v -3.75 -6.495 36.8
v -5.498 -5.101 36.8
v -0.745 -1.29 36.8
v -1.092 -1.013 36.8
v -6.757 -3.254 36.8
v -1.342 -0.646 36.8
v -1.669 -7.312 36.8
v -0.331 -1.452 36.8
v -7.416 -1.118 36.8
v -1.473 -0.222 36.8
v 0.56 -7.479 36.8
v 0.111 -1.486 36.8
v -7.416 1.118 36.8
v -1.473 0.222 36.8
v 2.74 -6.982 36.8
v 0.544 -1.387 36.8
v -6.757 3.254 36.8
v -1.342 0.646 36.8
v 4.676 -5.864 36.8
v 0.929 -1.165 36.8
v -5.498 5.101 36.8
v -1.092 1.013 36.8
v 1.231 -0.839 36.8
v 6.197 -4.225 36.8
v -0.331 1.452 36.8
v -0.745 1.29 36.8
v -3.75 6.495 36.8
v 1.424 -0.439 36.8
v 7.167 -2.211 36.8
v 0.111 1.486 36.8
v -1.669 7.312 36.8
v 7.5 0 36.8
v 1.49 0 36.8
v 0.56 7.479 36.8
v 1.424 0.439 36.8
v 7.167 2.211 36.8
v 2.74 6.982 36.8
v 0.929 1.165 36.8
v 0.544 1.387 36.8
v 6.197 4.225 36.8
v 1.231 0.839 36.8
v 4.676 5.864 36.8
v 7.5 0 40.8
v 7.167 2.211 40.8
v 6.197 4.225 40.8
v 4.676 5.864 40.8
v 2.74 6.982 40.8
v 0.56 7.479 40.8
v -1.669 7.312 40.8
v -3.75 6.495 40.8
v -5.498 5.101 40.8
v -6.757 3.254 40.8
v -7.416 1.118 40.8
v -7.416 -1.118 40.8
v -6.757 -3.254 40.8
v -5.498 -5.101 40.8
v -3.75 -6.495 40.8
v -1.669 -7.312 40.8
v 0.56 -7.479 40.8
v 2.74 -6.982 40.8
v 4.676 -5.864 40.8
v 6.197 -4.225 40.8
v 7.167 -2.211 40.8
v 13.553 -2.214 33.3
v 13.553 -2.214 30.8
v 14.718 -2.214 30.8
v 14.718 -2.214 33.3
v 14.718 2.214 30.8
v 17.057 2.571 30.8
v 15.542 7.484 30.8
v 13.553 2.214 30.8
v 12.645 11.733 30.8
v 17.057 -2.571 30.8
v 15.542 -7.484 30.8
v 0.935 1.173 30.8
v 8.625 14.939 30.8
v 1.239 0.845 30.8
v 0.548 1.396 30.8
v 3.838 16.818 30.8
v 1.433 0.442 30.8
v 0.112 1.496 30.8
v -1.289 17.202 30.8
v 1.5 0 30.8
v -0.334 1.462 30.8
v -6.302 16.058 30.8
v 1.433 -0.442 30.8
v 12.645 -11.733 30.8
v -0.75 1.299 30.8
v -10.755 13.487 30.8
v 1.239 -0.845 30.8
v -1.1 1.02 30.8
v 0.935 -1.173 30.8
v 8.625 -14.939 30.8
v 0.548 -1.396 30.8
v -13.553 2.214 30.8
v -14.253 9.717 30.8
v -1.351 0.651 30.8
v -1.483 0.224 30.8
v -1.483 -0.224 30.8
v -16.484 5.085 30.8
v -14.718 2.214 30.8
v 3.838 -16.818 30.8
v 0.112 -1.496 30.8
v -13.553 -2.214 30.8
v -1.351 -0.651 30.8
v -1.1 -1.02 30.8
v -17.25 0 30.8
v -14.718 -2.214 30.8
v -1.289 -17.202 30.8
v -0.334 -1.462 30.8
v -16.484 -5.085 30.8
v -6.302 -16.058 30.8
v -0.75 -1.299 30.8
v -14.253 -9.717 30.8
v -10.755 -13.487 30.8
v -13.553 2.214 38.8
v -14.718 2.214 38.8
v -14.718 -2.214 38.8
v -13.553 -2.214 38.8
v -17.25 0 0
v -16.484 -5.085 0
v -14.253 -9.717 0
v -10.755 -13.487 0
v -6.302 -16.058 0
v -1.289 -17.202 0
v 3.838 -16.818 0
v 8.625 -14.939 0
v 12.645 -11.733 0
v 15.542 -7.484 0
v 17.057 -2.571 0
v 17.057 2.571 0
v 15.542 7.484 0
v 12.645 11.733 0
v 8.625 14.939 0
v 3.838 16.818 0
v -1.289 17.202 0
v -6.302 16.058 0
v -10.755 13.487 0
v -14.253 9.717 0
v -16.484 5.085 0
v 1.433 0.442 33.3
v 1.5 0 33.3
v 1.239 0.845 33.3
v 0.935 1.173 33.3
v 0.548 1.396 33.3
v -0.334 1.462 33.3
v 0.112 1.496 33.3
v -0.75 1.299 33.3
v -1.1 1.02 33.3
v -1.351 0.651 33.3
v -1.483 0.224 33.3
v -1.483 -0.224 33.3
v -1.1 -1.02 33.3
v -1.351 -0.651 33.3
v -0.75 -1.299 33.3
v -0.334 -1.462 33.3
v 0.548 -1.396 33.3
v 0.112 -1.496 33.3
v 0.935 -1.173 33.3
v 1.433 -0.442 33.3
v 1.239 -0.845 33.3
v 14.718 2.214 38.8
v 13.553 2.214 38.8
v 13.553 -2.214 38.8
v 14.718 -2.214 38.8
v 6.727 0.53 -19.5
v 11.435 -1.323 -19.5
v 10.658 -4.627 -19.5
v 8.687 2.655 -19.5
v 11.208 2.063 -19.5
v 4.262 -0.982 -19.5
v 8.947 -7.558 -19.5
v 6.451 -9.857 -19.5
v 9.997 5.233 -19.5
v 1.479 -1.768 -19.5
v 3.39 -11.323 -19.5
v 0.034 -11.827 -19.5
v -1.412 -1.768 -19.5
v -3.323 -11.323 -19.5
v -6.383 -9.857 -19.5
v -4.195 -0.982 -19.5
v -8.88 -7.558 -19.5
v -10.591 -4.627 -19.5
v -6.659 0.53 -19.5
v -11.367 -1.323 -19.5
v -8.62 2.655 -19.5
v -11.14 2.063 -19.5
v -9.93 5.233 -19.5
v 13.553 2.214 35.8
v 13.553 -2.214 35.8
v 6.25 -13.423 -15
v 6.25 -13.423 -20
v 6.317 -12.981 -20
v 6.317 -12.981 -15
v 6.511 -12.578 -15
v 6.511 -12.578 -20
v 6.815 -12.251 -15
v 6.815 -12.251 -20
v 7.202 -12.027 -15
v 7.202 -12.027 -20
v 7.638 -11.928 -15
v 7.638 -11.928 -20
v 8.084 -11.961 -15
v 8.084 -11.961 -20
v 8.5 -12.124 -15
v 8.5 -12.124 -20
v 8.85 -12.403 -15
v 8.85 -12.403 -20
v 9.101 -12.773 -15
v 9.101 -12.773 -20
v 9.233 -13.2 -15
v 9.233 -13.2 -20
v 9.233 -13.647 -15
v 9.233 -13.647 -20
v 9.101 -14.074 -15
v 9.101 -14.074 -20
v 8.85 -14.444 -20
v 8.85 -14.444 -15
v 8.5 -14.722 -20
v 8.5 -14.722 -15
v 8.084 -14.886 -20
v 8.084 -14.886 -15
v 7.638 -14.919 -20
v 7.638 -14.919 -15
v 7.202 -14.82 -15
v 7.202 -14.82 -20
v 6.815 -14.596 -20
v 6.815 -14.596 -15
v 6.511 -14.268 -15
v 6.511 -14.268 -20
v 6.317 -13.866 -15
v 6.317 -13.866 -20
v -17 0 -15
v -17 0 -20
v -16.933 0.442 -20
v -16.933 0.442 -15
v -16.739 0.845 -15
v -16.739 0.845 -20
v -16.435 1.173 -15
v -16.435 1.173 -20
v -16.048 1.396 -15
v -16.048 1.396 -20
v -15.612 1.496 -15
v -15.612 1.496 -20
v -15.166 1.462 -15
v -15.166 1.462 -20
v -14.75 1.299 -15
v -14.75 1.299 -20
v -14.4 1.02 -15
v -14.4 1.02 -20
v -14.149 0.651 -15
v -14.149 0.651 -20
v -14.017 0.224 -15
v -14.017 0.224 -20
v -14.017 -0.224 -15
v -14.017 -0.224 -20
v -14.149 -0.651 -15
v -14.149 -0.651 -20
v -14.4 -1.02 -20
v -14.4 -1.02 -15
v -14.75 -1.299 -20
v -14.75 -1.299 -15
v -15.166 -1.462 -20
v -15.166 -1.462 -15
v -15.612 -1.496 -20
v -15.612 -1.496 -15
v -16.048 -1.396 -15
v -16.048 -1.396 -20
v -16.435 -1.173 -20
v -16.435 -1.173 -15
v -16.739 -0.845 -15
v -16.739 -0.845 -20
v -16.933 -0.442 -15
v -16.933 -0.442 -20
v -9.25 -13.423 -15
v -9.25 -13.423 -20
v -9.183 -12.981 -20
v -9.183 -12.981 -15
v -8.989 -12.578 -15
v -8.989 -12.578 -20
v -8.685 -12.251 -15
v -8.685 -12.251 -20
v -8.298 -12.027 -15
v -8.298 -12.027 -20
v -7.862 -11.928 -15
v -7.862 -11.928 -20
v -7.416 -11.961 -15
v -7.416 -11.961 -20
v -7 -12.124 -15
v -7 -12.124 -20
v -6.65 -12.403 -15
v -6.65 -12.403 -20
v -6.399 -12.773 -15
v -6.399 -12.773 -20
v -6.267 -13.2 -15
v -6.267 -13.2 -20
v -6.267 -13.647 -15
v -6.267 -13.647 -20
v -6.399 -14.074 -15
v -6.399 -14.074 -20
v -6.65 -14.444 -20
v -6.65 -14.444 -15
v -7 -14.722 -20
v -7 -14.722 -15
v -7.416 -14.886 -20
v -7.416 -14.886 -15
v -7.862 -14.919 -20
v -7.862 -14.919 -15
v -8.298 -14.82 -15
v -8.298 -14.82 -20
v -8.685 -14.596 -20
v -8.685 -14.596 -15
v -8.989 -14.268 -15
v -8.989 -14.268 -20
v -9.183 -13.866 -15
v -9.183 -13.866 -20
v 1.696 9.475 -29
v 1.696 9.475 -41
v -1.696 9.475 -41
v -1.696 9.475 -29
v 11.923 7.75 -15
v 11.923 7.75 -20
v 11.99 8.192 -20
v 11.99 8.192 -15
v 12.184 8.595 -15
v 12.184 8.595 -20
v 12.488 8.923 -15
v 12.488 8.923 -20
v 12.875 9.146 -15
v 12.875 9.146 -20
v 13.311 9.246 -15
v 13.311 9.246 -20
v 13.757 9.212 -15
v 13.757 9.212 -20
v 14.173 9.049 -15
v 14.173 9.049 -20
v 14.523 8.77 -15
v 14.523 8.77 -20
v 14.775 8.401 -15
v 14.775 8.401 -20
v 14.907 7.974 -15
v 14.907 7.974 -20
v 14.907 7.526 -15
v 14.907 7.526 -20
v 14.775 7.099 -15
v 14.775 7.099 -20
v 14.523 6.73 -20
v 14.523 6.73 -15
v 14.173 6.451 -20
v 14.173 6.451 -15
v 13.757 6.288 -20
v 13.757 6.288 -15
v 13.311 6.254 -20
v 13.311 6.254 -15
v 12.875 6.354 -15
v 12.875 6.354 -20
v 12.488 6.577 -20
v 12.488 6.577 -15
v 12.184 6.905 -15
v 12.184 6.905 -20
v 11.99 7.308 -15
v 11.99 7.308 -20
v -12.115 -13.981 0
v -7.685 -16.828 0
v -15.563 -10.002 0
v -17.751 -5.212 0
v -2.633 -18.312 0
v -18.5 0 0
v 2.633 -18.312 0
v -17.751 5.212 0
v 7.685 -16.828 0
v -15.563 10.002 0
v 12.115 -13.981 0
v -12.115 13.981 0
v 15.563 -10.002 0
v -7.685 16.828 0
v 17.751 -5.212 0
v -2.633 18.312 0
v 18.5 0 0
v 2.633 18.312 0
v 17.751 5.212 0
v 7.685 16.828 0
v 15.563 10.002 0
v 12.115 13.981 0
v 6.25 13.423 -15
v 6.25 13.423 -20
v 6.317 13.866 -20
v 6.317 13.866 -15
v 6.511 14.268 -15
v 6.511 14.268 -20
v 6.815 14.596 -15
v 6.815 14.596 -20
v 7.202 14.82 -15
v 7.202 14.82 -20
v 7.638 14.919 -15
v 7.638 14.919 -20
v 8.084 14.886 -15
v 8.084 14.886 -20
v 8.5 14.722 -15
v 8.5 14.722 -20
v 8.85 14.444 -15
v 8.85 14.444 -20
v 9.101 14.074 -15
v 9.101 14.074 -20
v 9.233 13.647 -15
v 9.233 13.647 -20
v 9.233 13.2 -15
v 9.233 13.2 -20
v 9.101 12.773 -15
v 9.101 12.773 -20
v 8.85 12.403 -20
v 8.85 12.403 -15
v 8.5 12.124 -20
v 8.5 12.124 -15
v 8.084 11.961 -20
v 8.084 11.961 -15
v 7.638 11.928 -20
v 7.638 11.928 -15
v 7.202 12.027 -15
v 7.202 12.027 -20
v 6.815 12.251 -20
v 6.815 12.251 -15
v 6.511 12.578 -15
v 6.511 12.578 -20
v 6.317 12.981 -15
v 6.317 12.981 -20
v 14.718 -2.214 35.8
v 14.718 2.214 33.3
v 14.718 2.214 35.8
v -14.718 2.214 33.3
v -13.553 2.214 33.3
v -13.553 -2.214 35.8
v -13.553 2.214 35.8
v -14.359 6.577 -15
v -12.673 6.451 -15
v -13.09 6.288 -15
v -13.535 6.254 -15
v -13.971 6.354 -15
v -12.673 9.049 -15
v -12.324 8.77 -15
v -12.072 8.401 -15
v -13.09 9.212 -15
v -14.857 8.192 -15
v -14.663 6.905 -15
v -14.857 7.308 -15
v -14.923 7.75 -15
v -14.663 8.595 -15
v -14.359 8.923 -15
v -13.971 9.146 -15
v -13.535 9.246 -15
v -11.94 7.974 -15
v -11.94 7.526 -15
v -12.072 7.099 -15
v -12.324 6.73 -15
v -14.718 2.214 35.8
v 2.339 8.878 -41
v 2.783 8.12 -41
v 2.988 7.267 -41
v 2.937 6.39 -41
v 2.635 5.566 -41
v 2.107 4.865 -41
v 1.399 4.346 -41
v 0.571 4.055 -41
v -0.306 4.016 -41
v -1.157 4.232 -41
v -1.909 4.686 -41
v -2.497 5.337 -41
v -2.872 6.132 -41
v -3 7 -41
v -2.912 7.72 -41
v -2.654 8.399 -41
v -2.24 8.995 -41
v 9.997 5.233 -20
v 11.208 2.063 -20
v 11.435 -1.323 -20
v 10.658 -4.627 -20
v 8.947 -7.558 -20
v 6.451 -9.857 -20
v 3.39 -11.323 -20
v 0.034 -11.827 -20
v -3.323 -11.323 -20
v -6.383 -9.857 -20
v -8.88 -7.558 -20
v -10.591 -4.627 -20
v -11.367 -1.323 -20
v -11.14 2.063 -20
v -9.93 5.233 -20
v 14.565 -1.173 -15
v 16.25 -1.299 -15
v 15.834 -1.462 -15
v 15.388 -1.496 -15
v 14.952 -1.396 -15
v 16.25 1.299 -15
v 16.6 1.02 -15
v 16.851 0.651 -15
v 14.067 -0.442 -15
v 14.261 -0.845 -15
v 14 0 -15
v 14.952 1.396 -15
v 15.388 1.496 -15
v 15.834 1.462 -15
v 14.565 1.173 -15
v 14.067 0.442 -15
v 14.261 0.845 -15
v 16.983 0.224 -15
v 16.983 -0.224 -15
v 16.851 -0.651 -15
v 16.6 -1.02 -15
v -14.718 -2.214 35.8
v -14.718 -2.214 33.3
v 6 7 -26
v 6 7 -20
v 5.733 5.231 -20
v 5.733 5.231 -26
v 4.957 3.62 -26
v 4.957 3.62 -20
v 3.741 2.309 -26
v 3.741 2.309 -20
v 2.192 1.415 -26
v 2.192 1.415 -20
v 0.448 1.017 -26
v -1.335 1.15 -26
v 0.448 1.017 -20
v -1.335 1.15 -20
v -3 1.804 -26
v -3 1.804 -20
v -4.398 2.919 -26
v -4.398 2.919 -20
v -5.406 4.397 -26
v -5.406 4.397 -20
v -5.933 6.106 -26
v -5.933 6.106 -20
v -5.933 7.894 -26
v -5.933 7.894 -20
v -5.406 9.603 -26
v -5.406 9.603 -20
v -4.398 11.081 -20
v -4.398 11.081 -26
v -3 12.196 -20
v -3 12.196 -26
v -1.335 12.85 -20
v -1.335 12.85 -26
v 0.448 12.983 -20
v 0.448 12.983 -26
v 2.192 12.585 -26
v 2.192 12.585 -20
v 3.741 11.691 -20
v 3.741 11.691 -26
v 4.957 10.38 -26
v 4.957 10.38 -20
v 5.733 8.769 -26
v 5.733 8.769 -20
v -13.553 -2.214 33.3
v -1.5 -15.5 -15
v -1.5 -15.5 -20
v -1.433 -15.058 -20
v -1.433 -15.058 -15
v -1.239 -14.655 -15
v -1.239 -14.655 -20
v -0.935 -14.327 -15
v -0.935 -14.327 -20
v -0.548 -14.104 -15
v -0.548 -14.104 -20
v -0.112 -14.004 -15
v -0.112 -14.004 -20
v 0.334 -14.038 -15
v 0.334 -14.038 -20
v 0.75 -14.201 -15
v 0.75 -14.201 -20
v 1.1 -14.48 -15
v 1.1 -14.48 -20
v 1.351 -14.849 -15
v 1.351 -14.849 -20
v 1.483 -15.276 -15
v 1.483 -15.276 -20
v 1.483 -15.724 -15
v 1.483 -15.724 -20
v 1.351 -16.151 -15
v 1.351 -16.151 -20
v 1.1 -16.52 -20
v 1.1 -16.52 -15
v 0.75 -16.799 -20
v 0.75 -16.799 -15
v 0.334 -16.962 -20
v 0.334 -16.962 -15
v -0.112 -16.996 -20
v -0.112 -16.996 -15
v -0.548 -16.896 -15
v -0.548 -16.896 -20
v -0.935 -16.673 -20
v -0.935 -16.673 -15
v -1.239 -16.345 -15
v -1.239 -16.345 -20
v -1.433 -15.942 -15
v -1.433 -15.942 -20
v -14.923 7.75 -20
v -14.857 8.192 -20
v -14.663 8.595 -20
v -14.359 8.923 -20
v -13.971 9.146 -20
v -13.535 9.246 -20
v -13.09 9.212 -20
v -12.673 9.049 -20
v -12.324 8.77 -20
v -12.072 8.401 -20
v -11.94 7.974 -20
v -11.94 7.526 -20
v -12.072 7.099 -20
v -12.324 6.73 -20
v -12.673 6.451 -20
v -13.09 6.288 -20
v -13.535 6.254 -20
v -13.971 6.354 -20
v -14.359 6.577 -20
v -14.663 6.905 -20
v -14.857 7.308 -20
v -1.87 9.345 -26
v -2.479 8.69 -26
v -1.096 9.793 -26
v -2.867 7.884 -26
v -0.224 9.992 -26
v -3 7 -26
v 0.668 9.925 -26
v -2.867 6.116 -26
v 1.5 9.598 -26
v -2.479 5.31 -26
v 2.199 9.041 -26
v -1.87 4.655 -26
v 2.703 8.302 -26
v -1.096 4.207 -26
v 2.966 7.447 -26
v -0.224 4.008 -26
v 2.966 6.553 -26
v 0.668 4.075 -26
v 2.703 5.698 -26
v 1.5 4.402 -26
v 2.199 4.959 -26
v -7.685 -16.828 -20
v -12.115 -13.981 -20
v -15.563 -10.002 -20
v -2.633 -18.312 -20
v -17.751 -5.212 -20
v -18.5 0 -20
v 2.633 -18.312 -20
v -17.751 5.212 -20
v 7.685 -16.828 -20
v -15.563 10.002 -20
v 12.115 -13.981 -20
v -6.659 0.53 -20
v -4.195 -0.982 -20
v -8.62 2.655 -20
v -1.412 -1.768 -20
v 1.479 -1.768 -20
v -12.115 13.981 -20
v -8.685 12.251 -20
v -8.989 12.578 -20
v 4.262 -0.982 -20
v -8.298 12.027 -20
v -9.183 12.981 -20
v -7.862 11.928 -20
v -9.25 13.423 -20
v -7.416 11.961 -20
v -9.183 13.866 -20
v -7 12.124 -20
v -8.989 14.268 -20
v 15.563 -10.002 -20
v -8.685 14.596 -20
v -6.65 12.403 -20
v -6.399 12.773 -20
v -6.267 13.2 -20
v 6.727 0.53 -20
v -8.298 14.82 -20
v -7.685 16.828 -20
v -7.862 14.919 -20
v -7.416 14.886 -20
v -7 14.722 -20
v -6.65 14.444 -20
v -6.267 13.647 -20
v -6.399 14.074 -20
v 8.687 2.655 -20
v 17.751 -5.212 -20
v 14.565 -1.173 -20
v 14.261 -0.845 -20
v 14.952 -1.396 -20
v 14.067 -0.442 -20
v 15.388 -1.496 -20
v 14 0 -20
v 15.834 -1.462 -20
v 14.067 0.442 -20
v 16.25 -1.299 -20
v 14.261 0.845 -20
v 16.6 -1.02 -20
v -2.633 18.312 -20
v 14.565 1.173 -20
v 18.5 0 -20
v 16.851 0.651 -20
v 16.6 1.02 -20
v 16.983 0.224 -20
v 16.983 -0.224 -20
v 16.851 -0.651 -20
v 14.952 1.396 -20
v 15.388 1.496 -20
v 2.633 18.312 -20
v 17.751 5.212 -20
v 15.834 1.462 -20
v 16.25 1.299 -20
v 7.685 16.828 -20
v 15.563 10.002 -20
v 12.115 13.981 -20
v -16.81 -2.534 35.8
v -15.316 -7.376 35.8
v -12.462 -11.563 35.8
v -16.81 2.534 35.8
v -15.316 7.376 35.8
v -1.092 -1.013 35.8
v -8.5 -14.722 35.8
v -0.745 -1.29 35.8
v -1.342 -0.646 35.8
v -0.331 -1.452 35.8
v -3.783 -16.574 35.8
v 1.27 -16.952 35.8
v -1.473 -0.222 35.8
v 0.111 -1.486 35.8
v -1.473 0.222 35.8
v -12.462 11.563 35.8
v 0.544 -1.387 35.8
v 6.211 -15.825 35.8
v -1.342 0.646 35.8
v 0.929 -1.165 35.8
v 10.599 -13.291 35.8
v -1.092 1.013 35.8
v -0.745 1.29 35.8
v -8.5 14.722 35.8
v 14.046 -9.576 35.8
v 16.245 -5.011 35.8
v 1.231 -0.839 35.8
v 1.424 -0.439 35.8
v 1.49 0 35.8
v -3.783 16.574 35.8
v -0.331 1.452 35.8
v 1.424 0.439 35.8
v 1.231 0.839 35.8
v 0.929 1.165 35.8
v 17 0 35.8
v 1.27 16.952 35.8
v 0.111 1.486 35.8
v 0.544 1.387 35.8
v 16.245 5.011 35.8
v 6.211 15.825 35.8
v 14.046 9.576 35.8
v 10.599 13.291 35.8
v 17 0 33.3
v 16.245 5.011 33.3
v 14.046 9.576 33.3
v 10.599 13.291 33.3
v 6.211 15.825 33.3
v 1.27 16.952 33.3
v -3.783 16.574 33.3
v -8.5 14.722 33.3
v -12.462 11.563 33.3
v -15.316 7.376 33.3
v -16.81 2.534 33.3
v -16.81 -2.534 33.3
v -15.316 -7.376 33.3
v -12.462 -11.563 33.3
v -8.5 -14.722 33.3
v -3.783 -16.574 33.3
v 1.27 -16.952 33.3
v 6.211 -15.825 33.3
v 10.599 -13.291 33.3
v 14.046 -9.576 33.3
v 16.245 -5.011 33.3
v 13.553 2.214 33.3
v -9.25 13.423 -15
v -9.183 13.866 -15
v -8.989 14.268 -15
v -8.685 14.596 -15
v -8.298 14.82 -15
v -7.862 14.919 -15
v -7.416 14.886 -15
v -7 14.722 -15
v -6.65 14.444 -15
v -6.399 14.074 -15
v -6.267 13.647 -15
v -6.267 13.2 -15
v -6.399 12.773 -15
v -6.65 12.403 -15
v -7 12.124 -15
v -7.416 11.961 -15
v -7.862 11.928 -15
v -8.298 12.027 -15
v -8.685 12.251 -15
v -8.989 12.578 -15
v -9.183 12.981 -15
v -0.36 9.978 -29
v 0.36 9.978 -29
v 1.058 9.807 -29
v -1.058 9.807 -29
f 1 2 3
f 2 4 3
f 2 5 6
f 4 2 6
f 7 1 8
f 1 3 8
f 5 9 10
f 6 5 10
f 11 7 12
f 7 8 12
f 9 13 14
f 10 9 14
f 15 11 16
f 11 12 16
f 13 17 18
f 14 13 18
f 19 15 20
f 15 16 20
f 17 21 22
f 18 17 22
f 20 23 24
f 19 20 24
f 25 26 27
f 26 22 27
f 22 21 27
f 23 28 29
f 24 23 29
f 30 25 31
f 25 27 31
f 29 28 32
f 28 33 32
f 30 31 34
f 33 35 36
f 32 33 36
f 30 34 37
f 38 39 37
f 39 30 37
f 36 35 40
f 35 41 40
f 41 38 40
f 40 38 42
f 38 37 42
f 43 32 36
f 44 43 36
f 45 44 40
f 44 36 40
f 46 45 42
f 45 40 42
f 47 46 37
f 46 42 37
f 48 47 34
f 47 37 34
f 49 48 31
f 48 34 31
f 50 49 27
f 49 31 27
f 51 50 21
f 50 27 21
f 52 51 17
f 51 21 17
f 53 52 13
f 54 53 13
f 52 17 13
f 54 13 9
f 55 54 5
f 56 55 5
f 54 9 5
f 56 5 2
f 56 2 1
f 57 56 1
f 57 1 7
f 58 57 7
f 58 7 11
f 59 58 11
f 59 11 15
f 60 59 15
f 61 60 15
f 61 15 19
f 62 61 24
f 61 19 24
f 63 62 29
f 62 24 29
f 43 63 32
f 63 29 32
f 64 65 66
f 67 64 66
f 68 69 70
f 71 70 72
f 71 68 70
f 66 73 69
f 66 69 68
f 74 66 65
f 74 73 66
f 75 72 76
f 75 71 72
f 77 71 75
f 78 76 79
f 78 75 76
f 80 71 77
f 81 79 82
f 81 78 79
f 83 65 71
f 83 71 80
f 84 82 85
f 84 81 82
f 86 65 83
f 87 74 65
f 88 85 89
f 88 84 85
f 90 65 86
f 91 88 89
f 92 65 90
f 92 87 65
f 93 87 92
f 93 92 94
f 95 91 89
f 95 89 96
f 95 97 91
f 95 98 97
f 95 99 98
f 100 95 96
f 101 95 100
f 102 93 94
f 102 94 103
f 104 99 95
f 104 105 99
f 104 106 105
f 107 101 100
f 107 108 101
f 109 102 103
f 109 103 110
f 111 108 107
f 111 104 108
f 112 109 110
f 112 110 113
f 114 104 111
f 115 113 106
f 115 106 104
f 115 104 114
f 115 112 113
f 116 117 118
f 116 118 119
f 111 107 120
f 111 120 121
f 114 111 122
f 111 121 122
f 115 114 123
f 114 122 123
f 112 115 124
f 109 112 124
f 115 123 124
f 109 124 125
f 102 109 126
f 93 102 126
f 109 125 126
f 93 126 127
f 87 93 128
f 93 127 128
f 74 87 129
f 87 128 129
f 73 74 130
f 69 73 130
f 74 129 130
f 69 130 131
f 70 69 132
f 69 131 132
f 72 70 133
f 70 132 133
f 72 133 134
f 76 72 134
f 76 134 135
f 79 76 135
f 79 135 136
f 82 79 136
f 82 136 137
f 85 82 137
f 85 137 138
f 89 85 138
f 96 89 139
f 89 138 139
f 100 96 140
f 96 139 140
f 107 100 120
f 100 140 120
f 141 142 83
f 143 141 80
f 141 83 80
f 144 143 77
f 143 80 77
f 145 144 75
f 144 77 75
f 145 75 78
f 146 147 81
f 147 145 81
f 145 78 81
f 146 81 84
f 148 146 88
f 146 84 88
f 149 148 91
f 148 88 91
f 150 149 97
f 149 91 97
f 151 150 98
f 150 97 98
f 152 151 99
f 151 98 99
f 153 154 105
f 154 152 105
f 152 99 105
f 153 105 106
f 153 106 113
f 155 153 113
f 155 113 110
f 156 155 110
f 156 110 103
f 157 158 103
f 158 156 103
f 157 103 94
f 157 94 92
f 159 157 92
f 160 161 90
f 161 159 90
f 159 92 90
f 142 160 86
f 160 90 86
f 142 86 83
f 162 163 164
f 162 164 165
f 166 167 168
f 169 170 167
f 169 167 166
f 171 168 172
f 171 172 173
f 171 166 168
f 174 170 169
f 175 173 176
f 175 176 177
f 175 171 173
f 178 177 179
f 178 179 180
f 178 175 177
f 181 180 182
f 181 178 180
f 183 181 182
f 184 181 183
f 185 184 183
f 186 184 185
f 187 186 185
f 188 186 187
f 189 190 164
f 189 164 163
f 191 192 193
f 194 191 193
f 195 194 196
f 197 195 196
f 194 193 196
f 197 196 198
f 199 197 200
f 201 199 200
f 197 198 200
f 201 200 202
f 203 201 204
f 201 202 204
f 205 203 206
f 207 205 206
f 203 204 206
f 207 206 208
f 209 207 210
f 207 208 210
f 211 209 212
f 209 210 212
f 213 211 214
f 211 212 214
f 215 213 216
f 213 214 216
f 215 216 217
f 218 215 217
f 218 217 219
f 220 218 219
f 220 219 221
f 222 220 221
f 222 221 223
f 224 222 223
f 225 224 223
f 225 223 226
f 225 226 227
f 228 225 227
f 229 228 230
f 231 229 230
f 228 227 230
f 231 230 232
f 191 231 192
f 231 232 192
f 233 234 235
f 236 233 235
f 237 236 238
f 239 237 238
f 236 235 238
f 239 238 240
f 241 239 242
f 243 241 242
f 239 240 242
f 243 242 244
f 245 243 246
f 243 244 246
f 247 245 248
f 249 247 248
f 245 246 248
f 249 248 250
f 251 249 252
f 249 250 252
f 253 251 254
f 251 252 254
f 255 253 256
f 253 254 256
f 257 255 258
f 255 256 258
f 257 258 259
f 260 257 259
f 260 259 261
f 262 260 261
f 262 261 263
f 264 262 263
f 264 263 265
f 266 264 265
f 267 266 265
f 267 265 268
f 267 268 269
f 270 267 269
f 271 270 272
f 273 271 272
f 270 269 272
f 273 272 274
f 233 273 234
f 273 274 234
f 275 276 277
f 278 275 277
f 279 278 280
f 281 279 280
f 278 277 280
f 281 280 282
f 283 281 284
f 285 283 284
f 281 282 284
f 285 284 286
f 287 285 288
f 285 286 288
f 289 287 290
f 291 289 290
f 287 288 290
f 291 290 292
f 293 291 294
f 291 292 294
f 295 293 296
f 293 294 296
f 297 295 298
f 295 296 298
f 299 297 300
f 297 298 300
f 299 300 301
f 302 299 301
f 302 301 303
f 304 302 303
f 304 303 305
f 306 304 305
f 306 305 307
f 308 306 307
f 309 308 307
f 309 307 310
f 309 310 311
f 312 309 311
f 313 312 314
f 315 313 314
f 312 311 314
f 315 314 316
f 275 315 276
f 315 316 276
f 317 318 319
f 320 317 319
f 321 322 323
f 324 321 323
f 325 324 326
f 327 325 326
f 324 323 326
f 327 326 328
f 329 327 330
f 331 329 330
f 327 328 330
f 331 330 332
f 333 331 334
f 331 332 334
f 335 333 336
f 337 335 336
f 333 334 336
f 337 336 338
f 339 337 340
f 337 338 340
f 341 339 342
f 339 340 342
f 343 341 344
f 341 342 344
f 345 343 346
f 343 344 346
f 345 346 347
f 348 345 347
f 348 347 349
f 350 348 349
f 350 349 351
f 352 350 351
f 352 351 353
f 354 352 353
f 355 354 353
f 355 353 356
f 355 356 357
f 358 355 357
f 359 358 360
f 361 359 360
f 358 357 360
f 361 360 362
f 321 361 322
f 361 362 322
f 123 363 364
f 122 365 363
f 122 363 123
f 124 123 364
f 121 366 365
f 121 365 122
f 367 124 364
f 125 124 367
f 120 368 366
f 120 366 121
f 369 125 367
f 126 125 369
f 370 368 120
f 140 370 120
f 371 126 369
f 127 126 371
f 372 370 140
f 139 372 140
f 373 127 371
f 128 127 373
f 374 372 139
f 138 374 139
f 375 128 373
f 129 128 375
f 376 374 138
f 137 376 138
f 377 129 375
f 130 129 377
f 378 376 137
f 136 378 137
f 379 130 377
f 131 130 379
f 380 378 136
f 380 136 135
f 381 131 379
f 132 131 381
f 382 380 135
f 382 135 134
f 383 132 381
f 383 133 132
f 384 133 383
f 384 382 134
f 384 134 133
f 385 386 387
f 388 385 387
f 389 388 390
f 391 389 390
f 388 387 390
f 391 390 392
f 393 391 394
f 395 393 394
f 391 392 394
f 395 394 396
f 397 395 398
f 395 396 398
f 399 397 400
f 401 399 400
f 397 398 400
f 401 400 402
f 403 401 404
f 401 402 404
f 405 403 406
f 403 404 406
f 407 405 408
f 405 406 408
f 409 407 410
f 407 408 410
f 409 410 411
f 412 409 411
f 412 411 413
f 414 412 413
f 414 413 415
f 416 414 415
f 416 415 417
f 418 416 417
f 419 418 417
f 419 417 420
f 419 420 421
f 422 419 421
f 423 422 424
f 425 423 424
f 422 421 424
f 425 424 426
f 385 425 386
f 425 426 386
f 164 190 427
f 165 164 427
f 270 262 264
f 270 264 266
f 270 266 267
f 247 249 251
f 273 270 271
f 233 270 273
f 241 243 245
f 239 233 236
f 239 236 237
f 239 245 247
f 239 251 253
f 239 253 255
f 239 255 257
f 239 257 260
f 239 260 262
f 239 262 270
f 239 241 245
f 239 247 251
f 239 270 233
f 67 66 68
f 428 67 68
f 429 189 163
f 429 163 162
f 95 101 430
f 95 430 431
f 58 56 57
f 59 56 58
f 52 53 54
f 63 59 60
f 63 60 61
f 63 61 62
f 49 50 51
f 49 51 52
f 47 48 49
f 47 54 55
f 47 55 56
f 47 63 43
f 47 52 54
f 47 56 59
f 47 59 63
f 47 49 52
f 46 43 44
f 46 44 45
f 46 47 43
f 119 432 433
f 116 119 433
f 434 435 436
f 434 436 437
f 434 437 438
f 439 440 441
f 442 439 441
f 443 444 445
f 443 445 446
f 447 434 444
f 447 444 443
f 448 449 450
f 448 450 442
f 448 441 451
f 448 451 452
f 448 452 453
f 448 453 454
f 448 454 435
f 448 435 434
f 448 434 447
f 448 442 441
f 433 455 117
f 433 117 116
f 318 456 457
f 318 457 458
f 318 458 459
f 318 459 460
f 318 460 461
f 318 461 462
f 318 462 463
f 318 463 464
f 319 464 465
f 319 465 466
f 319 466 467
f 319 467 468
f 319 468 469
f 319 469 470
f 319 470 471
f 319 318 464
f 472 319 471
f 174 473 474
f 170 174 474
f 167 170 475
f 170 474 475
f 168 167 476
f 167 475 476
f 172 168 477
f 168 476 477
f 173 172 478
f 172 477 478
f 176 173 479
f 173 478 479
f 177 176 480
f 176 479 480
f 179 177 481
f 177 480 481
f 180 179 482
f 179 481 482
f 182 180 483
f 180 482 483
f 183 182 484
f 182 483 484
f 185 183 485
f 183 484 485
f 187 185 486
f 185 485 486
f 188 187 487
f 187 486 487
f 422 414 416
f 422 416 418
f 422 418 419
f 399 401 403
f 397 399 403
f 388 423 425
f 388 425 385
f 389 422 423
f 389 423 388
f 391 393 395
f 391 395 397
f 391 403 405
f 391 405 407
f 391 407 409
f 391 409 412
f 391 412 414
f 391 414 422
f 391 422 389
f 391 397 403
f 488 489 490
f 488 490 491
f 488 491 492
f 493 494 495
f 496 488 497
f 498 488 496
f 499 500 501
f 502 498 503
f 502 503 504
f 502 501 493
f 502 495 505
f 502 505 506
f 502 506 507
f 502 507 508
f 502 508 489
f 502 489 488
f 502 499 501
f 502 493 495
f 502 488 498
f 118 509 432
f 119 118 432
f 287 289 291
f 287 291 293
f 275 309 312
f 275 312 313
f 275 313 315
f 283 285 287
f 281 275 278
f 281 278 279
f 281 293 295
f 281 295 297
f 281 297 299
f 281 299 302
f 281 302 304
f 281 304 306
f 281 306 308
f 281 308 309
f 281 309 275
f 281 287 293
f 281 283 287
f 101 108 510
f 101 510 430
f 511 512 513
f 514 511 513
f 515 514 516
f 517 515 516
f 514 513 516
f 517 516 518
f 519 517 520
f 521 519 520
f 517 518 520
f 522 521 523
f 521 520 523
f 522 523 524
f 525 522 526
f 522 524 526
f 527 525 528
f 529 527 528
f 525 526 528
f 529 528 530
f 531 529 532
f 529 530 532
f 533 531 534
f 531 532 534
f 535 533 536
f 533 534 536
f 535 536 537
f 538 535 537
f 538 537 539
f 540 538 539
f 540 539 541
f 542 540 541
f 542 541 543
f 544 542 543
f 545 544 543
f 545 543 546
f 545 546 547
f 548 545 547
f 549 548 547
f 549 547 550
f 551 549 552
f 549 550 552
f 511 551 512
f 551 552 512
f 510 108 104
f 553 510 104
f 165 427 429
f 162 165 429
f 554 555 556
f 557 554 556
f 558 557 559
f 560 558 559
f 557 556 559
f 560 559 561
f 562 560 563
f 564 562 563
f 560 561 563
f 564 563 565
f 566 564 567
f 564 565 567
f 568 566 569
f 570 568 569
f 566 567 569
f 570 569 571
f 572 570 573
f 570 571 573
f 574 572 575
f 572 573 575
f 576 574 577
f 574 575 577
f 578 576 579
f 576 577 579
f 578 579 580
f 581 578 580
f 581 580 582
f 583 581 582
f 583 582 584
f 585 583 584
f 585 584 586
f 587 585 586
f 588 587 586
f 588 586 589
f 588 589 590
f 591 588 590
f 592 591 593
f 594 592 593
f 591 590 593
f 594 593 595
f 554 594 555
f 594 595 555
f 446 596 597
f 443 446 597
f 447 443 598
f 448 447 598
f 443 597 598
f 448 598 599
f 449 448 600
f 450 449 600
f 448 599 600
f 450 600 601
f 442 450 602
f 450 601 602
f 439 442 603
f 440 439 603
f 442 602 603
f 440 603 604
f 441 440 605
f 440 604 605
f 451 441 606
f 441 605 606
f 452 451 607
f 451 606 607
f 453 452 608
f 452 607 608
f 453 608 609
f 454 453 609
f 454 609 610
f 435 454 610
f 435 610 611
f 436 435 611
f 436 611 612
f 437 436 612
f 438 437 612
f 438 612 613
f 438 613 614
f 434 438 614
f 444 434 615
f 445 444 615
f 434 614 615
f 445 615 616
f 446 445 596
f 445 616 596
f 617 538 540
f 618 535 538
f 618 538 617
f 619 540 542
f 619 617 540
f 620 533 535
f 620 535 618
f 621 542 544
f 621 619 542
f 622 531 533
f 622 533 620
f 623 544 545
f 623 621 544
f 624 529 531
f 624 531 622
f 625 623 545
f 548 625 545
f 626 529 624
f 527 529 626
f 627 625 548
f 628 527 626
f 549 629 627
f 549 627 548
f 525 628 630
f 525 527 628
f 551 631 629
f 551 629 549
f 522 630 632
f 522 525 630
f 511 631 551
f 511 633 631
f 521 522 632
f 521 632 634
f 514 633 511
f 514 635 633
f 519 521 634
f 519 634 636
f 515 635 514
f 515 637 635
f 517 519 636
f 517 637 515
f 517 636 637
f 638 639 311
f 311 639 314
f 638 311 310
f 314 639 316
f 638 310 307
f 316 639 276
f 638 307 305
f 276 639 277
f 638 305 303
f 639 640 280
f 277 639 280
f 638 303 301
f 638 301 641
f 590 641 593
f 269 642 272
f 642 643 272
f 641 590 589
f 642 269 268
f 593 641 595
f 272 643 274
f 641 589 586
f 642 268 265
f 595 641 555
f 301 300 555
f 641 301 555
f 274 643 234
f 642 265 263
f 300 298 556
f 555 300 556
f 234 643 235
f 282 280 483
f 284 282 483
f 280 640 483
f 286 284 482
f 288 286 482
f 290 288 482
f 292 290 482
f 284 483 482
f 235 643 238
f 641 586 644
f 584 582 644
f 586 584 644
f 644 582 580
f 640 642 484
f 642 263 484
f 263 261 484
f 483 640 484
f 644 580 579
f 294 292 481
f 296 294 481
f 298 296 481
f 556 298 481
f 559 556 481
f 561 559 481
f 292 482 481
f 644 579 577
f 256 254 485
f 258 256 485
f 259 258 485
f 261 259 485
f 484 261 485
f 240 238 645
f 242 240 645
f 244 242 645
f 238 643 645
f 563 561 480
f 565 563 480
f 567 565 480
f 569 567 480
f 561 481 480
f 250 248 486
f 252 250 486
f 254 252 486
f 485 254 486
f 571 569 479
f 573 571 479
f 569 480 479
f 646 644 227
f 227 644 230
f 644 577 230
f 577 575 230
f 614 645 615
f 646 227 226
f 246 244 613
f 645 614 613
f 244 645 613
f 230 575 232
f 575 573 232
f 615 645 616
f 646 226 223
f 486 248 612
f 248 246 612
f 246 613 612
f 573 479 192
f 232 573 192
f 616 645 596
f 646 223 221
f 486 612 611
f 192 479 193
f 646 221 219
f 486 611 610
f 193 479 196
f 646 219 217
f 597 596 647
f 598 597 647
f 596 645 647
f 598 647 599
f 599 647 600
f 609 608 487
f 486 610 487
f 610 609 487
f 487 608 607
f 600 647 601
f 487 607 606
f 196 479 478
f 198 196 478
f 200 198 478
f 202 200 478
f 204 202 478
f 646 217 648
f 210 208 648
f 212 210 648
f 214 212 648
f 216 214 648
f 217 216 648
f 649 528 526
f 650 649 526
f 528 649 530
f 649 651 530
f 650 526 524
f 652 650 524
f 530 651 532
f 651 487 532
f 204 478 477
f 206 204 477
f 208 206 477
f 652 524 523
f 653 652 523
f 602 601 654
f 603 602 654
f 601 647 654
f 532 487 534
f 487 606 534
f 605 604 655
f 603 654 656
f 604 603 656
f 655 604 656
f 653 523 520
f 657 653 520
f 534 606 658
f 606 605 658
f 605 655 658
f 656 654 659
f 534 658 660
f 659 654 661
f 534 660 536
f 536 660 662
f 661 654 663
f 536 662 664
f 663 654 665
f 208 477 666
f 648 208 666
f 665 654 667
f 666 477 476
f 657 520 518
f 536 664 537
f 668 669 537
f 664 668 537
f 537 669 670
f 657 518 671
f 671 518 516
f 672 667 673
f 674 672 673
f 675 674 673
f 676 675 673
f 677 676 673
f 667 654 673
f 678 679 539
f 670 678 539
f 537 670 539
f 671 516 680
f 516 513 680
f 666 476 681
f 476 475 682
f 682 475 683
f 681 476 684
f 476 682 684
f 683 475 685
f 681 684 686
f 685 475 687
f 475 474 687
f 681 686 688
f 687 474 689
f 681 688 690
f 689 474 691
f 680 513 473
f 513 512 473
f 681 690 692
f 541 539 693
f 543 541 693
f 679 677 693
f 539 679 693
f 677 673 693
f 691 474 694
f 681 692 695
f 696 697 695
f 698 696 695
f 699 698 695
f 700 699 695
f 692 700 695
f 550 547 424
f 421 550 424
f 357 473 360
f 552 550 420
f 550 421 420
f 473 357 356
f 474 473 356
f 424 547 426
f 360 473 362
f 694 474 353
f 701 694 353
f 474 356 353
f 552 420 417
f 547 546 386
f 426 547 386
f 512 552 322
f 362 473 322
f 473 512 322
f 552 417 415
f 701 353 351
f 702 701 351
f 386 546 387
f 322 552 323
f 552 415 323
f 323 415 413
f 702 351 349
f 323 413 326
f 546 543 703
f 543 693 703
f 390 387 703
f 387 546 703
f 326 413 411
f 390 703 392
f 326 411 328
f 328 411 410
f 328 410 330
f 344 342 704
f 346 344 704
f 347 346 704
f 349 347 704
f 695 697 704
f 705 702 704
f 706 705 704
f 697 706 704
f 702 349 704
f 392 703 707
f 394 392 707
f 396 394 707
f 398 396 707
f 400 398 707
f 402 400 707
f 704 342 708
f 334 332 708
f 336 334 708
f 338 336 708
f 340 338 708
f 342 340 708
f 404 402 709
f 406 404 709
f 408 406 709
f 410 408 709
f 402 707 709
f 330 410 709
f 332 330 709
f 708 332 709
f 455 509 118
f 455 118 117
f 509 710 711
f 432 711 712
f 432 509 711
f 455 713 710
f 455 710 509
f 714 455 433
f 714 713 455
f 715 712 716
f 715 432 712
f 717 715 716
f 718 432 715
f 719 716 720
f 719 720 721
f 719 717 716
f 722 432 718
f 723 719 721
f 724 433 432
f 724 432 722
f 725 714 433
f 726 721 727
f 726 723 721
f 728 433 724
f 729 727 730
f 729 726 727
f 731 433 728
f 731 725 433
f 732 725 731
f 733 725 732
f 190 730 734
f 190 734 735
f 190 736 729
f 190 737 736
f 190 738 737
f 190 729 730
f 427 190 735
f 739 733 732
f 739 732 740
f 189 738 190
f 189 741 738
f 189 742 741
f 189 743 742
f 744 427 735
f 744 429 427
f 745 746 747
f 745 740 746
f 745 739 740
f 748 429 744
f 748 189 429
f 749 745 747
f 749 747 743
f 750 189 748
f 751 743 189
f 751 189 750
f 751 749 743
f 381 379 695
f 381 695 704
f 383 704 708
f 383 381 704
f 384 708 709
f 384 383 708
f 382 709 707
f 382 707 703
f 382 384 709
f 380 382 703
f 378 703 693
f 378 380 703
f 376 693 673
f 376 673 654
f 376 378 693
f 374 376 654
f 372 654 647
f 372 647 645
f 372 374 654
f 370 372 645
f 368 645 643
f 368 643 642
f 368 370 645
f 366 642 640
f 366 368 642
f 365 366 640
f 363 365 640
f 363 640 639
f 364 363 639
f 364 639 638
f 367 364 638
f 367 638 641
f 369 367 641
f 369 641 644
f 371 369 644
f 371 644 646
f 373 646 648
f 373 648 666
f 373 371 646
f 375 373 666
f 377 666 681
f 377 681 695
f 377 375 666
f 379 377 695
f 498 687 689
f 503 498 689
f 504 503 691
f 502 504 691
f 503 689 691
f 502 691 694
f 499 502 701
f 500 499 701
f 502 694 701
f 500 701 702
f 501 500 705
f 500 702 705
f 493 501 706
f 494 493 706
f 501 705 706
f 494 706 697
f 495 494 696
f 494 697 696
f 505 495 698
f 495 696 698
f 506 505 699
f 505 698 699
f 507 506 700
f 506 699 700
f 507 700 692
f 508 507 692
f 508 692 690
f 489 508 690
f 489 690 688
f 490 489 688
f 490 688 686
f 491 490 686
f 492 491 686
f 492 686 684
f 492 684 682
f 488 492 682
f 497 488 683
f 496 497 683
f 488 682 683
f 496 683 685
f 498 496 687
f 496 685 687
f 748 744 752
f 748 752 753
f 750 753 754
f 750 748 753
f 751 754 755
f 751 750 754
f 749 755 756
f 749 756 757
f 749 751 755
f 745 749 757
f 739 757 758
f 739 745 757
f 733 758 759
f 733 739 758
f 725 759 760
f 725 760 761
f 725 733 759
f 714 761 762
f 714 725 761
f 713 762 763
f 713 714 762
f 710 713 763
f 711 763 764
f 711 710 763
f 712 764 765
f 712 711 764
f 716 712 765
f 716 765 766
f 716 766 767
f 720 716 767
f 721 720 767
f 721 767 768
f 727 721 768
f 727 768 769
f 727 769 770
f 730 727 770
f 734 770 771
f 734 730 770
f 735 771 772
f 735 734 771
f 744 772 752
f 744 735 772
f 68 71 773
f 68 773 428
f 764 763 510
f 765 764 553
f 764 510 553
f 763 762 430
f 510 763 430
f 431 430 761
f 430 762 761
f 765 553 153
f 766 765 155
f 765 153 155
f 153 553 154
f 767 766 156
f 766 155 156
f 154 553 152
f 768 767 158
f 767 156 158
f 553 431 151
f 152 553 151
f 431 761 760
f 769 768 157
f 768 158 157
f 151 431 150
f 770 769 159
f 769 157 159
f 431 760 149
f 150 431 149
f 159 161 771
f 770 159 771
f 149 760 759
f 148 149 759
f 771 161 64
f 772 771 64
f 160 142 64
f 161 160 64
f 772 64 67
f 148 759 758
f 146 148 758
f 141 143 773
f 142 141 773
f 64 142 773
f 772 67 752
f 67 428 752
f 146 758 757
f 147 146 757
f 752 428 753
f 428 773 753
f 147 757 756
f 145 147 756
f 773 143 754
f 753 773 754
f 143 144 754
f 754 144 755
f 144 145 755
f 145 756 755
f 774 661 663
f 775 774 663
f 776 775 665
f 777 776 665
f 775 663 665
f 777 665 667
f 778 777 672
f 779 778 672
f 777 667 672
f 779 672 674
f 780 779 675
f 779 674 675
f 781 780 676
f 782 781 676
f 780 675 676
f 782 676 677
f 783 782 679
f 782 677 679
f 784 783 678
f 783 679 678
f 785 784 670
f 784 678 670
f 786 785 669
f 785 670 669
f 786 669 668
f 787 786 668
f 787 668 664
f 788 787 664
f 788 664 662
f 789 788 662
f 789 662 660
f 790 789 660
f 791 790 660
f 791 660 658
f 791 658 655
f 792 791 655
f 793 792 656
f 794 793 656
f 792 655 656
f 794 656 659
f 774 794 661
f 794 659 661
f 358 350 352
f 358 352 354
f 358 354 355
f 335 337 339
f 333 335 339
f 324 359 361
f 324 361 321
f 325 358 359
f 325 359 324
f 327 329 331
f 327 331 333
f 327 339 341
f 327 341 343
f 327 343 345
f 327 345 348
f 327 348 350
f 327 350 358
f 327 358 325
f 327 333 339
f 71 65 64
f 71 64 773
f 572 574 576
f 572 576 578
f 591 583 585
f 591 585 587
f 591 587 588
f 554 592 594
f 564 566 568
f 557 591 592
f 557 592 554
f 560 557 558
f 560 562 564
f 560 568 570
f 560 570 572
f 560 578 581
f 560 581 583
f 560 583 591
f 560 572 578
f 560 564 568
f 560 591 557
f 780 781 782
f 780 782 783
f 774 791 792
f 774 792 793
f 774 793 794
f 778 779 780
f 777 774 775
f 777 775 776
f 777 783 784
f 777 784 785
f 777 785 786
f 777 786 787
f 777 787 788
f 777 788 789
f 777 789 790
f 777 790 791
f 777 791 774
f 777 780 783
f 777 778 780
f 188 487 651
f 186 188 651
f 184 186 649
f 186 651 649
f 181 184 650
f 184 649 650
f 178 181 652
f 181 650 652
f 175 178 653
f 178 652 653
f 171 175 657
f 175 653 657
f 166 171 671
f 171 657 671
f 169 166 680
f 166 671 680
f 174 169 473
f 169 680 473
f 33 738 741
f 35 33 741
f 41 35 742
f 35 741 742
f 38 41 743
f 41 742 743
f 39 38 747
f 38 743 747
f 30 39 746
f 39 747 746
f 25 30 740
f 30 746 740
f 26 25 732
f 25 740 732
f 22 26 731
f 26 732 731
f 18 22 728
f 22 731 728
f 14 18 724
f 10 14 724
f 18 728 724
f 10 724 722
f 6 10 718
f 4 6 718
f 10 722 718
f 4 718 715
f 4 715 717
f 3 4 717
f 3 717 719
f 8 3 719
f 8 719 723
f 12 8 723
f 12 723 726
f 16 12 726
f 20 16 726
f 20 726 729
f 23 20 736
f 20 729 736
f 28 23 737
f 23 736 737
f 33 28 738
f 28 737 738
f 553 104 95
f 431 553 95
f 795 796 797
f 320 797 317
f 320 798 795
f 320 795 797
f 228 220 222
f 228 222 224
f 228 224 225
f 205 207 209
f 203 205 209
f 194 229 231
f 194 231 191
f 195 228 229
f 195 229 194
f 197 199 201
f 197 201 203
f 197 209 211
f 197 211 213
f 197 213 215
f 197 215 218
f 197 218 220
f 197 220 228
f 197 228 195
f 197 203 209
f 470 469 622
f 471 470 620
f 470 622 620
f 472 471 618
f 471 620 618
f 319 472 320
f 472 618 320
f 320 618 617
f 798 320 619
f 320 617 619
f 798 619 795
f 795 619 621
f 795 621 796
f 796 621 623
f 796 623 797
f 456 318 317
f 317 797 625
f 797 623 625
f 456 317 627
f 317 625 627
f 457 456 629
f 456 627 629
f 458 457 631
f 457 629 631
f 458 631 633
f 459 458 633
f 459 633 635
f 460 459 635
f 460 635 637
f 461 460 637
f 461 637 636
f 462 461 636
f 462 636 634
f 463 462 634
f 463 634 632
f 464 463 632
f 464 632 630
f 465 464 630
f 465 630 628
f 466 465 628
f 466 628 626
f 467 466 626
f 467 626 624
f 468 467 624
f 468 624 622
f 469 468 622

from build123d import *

# Parameters (mm, degrees)
SKETCH1_R            = 18.5
BOSS_EXTRUDE2_DEPTH  = 20
SKETCH2_R            = 17.25
BOSS_EXTRUDE3_DEPTH  = 30.8
SKETCH3_R            = 1.5
BOSS_EXTRUDE4_DEPTH  = 5
SKETCH5_W            = 1.164728471
SKETCH5_H            = 4.428190706
BOSS_EXTRUDE9_DEPTH  = 8
SKETCH6_R            = 6
BOSS_EXTRUDE12_DEPTH = 6
SKETCH9_R            = 3
BOSS_EXTRUDE13_DEPTH = 15
SKETCH10_W           = 6.033853608
SKETCH10_H           = 1
CUT_EXTRUDE1_DEPTH   = 12
SKETCH11_R           = 1.5
CUT_EXTRUDE4_DEPTH   = 5
CUT_EXTRUDE5_DEPTH   = 0.5
SKETCH13_R           = 17
BOSS_EXTRUDE14_DEPTH = 2.5
SKETCH15_R           = 1.489724088
BOSS_EXTRUDE16_DEPTH = 1
SKETCH16_R           = 7.5
BOSS_EXTRUDE17_DEPTH = 4


# Read off the part's stored shape, not the designer's step: moBlkMgr[GB37]
with BuildPart() as part:
    # Sketch1 → Boss-Extrude2 (new body)
    with BuildSketch(Plane.XY):
        Circle(SKETCH1_R)
    extrude(amount=-BOSS_EXTRUDE2_DEPTH)

    # Sketch2 → Boss-Extrude3 (add)
    with BuildSketch(Plane.XY):
        with Locations(Location((0, 0, 0), (0, 0, 180))):
            Circle(SKETCH2_R)
    extrude(amount=BOSS_EXTRUDE3_DEPTH)

    # Sketch3 → Boss-Extrude4 (add)
    with BuildSketch(Plane.XY.offset(30.8)):
        Circle(SKETCH3_R)
    extrude(amount=BOSS_EXTRUDE4_DEPTH)

    # Sketch5 → Boss-Extrude9 (add)
    with BuildSketch(Plane.XY.offset(30.8)):
        with Locations((14.135311547, 0)):
            Rectangle(SKETCH5_W, SKETCH5_H)
        with Locations((-14.135311547, 0)):
            Rectangle(SKETCH5_W, SKETCH5_H)
    extrude(amount=BOSS_EXTRUDE9_DEPTH)

    # Sketch6 → Boss-Extrude12 (add)
    with BuildSketch(Plane(origin=(0, 0, -20), x_dir=(-1, 0, 0), z_dir=(0, 0, -1))):
        with Locations(Location((0, 7, 0), (0, 0, 180))):
            Circle(SKETCH6_R)
    extrude(amount=BOSS_EXTRUDE12_DEPTH)

    # Sketch9 → Boss-Extrude13 (add)
    with BuildSketch(Plane(origin=(0, 0, -26), x_dir=(-1, 0, 0), z_dir=(0, 0, -1))):
        with Locations((0, 7)):
            Circle(SKETCH9_R)
    extrude(amount=BOSS_EXTRUDE13_DEPTH)

    # Sketch10 → Cut-Extrude1 (cut)
    with BuildSketch(Plane(origin=(0, 0, -41), x_dir=(-1, 0, 0), z_dir=(0, 0, -1))):
        with Locations((0, 9.974859546)):
            Rectangle(SKETCH10_W, SKETCH10_H)
    extrude(amount=-CUT_EXTRUDE1_DEPTH, mode=Mode.SUBTRACT)

    # Sketch11 → Cut-Extrude4 (cut)
    with BuildSketch(Plane(origin=(0, 0, -20), x_dir=(-1, 0, 0), z_dir=(0, 0, -1))):
        with Locations((7.75, 13.423393759)):
            Circle(SKETCH11_R)
        with Locations((15.5, 0)):
            Circle(SKETCH11_R)
        with Locations((7.75, -13.423393759)):
            Circle(SKETCH11_R)
        with Locations((0, -15.5)):
            Circle(SKETCH11_R)
        with Locations((-7.75, -13.423393759)):
            Circle(SKETCH11_R)
        with Locations((-15.5, 0)):
            Circle(SKETCH11_R)
        with Locations((-13.423393759, 7.75)):
            Circle(SKETCH11_R)
        with Locations((-7.75, 13.423393759)):
            Circle(SKETCH11_R)
        with Locations((13.423393759, 7.75)):
            Circle(SKETCH11_R)
    extrude(amount=-CUT_EXTRUDE4_DEPTH, mode=Mode.SUBTRACT)

    # Sketch12 → Cut-Extrude5 (cut)
    with BuildSketch(Plane(origin=(0, 0, -20), x_dir=(-1, 0, 0), z_dir=(0, 0, -1))):
        with BuildLine():
            ThreePointArc((-9.996975987, 5.233316288), (-0.033546899, -11.826522584), (9.929882188, 5.233316288))
            ThreePointArc((9.929882188, 5.233316288), (-0.033546899, -1.867556413), (-9.996975987, 5.233316288))
        make_face()
    extrude(amount=-CUT_EXTRUDE5_DEPTH, mode=Mode.SUBTRACT)

    # Sketch13 → Boss-Extrude14 (add)
    with BuildSketch(Plane.XY.offset(35.8)):
        Circle(SKETCH13_R)
    extrude(amount=-BOSS_EXTRUDE14_DEPTH)

    # Sketch15 → Boss-Extrude16 (add)
    with BuildSketch(Plane.XY.offset(35.8)):
        Circle(SKETCH15_R)
    extrude(amount=BOSS_EXTRUDE16_DEPTH)

    # Sketch16 → Boss-Extrude17 (add)
    with BuildSketch(Plane.XY.offset(36.8)):
        Circle(SKETCH16_R)
    extrude(amount=BOSS_EXTRUDE17_DEPTH)


solid = part.part
